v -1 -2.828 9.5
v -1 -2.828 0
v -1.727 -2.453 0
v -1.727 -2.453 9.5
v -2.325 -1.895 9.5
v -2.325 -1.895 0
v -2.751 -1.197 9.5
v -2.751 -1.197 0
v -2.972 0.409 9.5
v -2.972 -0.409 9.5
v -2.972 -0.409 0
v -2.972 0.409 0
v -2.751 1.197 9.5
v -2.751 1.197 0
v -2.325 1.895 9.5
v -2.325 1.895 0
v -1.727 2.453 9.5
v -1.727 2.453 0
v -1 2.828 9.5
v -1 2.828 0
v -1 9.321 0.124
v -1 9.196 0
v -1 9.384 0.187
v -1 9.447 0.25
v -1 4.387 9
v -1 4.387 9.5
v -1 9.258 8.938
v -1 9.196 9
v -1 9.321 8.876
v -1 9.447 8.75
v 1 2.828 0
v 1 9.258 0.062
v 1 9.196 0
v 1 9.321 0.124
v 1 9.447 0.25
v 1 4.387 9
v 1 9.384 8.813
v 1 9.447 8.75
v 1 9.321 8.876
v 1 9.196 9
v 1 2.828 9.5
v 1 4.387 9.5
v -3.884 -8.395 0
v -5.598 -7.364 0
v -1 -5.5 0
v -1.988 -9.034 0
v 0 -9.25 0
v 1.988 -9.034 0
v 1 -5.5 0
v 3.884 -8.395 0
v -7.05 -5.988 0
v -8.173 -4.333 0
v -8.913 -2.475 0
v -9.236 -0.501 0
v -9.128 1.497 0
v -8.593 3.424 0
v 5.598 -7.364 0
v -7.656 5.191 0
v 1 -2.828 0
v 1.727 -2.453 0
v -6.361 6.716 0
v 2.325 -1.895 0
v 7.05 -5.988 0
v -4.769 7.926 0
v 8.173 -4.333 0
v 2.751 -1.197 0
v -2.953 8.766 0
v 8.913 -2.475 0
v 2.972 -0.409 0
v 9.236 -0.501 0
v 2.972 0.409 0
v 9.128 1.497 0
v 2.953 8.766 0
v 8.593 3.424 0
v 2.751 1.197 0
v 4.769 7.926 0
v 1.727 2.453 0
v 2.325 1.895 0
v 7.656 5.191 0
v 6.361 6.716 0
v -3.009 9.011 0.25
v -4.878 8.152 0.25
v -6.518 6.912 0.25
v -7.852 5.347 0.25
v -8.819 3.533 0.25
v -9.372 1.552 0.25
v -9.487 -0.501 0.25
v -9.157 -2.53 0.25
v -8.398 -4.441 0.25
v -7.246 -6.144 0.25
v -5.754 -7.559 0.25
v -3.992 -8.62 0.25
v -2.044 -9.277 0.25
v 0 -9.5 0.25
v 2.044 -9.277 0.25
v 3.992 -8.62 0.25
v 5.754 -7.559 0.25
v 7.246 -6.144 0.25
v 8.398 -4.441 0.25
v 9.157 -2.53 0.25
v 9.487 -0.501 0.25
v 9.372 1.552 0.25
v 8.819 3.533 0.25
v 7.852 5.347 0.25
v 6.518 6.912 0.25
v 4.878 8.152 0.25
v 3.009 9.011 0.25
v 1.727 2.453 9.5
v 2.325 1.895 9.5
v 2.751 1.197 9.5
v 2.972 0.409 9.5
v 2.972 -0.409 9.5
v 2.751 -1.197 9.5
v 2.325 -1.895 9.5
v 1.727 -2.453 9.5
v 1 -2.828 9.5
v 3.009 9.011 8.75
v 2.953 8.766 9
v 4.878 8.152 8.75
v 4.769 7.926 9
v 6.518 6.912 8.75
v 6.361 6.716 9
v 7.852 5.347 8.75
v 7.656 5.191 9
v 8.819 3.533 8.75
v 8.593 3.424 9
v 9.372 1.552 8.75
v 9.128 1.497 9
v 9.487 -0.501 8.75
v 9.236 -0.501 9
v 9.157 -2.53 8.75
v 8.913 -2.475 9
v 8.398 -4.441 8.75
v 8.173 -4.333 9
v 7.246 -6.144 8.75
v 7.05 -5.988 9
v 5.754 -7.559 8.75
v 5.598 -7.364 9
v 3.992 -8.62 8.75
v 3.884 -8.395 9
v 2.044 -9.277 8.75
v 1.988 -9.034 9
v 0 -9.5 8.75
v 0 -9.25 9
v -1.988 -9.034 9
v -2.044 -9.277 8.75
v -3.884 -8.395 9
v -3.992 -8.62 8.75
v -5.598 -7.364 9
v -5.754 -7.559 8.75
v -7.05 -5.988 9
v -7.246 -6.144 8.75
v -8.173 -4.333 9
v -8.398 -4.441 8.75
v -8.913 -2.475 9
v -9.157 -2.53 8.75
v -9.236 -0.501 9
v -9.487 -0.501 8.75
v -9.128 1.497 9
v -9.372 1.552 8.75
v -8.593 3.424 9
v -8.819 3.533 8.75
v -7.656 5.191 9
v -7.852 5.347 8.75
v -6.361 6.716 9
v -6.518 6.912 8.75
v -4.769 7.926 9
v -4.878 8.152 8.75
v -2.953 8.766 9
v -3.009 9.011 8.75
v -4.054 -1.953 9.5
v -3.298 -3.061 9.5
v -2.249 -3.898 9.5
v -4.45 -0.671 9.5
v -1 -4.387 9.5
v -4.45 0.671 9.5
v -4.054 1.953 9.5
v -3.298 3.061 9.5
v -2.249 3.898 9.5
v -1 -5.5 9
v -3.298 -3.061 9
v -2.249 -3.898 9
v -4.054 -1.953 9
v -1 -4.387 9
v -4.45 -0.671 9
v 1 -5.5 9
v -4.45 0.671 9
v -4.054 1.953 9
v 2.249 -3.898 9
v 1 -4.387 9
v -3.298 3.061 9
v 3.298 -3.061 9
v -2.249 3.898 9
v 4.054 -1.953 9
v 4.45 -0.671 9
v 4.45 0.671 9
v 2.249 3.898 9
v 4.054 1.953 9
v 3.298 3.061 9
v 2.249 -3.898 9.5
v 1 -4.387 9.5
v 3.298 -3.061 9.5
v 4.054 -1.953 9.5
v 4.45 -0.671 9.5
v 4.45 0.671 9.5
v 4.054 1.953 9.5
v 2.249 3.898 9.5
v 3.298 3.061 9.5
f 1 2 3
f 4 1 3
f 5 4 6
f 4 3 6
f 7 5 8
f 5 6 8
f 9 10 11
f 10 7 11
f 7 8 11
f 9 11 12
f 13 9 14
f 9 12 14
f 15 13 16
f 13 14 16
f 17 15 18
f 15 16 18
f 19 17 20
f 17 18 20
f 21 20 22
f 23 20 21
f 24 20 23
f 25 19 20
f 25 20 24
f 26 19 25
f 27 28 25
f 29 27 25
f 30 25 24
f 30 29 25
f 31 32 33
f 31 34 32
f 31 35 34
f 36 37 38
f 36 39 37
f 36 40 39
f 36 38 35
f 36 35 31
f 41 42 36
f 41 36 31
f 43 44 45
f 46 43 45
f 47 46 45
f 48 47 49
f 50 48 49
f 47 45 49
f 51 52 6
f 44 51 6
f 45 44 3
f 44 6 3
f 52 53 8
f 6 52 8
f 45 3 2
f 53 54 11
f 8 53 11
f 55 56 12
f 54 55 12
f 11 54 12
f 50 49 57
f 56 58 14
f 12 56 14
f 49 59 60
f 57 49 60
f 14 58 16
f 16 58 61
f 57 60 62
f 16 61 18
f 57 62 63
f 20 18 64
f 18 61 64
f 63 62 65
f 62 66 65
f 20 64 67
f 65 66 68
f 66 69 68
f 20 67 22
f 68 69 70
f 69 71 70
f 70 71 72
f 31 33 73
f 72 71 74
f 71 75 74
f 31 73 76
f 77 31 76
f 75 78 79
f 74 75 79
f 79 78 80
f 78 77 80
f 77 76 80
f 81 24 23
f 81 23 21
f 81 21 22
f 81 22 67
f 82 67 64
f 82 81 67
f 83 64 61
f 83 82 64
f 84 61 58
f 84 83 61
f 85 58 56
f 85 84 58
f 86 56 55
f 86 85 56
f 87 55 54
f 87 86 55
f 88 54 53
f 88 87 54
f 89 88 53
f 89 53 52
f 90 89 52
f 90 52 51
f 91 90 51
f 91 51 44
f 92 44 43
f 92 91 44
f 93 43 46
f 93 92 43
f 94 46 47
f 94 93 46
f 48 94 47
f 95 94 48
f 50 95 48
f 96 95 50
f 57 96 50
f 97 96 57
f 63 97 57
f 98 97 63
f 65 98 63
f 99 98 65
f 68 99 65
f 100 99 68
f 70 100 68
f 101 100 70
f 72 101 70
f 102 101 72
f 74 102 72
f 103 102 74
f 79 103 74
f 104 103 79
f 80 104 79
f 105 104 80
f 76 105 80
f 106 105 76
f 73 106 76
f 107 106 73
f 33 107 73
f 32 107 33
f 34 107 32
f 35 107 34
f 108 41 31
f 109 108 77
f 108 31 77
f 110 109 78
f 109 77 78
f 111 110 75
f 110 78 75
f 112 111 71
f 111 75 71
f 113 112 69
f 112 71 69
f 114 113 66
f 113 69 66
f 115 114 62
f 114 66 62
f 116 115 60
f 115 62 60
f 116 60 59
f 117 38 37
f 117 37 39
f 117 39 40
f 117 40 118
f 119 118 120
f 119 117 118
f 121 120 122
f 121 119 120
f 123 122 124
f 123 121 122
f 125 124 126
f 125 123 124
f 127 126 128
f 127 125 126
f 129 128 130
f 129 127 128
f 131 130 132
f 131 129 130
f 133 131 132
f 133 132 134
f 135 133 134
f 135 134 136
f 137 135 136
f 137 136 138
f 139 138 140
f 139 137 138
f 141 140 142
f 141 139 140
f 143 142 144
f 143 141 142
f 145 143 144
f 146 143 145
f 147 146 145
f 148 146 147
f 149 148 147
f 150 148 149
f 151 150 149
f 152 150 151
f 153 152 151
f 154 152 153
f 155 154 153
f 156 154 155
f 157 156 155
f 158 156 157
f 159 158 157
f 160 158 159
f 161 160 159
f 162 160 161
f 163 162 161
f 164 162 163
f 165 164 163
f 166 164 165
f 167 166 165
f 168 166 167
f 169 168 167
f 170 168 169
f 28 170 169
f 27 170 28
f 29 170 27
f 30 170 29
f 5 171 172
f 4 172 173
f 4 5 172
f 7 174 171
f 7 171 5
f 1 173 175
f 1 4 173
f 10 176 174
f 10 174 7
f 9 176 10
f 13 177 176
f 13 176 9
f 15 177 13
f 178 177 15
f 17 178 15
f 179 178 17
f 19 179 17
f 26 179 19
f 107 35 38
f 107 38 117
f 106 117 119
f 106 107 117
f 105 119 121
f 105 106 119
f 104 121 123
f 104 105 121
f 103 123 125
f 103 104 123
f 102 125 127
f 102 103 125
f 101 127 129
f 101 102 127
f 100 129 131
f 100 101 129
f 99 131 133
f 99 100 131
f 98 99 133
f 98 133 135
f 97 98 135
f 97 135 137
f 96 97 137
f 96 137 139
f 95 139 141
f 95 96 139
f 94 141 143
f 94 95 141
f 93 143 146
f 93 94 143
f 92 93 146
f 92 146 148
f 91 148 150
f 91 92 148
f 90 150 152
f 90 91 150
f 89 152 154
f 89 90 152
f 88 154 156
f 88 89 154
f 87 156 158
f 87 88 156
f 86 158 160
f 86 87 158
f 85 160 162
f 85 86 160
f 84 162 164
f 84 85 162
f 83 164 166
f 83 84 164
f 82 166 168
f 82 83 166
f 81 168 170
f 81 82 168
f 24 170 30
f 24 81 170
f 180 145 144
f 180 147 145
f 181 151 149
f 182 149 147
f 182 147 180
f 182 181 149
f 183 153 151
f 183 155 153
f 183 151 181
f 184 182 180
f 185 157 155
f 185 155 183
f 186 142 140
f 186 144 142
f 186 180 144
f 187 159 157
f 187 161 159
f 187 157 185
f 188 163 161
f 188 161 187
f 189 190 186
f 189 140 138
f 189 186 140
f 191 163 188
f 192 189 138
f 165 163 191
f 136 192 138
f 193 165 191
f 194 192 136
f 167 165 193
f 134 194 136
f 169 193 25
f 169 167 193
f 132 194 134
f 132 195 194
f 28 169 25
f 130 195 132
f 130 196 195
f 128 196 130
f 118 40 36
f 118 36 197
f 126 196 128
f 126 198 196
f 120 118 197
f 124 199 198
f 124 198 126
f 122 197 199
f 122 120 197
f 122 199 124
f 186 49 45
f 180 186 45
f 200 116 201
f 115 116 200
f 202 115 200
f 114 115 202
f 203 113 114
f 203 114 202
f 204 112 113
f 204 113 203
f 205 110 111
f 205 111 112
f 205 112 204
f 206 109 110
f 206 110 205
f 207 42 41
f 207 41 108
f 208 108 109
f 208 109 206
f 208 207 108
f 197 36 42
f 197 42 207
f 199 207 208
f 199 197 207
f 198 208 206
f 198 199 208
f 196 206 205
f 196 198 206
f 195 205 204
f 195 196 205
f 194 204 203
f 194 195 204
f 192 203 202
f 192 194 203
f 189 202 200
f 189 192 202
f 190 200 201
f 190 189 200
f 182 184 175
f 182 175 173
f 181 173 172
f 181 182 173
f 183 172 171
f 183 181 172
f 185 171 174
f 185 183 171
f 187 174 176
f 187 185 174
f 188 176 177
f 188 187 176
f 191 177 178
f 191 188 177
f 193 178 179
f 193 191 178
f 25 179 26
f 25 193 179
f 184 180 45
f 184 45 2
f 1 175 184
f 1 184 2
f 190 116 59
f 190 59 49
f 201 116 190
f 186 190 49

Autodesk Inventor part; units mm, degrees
ref_plane "YZ Plane" through (0, 0, 0) normal (1, 0, 0) x (0, 1, 0)
ref_plane "XZ Plane" through (0, 0, 0) normal (0, 1, 0) x (-1, 0, 0)
ref_plane "XY Plane" through (0, 0, 0) normal (0, 0, 1) x (1, 0, 0)
sketch "Base" plane through (0, 0, 0) normal (0, 0, 1) x (1, 0, 0)
  circle A0 centre (0, 0) radius 3
  circle A1 centre (0, 0) radius 9.5
  dimension "d0" = 6
  dimension "d1" = 19
extrude "Extrusion1" add sketch "Base" along normal blind 9
sketch "Sketch2" plane through (0, 0, 9) normal (0, 0, 1) x (1, 0, 0)
  circle A0 centre (0, 0) radius 4.5
  circle A1 centre (0, 0) radius 3 projected
  dimension "d4" = 9
extrude "Extrusion2" add sketch "Sketch2" along normal blind 0.5
chamfer "Chamfer1" distance 0.25 angle 45 2 edges at (-9.5, 0, 9) (-9.5, 0, 0)
sketch "Sketch3" plane through (0, 0, 9) normal (0, 0, 1) x (1, 0, 0)
  line L0 (0, -5.5) -> (0, 9.5)
  circle A0 centre (0, 0) radius 9.5 projected
  line L1 (-1, 9.5) -> (1, 9.5)
  line L2 (1, 9.5) -> (1, -5.5)
  line L3 (1, -5.5) -> (-1, -5.5)
  line L4 (-1, -5.5) -> (-1, 9.5)
  point P0 (-1, 9.4472)
  point P1 (1, 9.4472)
  dimension "d10" = 15
  dimension "d11" = 2
extrude "Extrusion3" cut sketch "Sketch3" against normal through all both and the other way through all contours L3 L4 A0 L0 | L0 A0 L2 L3
properties part number "ShoulderCollar"
